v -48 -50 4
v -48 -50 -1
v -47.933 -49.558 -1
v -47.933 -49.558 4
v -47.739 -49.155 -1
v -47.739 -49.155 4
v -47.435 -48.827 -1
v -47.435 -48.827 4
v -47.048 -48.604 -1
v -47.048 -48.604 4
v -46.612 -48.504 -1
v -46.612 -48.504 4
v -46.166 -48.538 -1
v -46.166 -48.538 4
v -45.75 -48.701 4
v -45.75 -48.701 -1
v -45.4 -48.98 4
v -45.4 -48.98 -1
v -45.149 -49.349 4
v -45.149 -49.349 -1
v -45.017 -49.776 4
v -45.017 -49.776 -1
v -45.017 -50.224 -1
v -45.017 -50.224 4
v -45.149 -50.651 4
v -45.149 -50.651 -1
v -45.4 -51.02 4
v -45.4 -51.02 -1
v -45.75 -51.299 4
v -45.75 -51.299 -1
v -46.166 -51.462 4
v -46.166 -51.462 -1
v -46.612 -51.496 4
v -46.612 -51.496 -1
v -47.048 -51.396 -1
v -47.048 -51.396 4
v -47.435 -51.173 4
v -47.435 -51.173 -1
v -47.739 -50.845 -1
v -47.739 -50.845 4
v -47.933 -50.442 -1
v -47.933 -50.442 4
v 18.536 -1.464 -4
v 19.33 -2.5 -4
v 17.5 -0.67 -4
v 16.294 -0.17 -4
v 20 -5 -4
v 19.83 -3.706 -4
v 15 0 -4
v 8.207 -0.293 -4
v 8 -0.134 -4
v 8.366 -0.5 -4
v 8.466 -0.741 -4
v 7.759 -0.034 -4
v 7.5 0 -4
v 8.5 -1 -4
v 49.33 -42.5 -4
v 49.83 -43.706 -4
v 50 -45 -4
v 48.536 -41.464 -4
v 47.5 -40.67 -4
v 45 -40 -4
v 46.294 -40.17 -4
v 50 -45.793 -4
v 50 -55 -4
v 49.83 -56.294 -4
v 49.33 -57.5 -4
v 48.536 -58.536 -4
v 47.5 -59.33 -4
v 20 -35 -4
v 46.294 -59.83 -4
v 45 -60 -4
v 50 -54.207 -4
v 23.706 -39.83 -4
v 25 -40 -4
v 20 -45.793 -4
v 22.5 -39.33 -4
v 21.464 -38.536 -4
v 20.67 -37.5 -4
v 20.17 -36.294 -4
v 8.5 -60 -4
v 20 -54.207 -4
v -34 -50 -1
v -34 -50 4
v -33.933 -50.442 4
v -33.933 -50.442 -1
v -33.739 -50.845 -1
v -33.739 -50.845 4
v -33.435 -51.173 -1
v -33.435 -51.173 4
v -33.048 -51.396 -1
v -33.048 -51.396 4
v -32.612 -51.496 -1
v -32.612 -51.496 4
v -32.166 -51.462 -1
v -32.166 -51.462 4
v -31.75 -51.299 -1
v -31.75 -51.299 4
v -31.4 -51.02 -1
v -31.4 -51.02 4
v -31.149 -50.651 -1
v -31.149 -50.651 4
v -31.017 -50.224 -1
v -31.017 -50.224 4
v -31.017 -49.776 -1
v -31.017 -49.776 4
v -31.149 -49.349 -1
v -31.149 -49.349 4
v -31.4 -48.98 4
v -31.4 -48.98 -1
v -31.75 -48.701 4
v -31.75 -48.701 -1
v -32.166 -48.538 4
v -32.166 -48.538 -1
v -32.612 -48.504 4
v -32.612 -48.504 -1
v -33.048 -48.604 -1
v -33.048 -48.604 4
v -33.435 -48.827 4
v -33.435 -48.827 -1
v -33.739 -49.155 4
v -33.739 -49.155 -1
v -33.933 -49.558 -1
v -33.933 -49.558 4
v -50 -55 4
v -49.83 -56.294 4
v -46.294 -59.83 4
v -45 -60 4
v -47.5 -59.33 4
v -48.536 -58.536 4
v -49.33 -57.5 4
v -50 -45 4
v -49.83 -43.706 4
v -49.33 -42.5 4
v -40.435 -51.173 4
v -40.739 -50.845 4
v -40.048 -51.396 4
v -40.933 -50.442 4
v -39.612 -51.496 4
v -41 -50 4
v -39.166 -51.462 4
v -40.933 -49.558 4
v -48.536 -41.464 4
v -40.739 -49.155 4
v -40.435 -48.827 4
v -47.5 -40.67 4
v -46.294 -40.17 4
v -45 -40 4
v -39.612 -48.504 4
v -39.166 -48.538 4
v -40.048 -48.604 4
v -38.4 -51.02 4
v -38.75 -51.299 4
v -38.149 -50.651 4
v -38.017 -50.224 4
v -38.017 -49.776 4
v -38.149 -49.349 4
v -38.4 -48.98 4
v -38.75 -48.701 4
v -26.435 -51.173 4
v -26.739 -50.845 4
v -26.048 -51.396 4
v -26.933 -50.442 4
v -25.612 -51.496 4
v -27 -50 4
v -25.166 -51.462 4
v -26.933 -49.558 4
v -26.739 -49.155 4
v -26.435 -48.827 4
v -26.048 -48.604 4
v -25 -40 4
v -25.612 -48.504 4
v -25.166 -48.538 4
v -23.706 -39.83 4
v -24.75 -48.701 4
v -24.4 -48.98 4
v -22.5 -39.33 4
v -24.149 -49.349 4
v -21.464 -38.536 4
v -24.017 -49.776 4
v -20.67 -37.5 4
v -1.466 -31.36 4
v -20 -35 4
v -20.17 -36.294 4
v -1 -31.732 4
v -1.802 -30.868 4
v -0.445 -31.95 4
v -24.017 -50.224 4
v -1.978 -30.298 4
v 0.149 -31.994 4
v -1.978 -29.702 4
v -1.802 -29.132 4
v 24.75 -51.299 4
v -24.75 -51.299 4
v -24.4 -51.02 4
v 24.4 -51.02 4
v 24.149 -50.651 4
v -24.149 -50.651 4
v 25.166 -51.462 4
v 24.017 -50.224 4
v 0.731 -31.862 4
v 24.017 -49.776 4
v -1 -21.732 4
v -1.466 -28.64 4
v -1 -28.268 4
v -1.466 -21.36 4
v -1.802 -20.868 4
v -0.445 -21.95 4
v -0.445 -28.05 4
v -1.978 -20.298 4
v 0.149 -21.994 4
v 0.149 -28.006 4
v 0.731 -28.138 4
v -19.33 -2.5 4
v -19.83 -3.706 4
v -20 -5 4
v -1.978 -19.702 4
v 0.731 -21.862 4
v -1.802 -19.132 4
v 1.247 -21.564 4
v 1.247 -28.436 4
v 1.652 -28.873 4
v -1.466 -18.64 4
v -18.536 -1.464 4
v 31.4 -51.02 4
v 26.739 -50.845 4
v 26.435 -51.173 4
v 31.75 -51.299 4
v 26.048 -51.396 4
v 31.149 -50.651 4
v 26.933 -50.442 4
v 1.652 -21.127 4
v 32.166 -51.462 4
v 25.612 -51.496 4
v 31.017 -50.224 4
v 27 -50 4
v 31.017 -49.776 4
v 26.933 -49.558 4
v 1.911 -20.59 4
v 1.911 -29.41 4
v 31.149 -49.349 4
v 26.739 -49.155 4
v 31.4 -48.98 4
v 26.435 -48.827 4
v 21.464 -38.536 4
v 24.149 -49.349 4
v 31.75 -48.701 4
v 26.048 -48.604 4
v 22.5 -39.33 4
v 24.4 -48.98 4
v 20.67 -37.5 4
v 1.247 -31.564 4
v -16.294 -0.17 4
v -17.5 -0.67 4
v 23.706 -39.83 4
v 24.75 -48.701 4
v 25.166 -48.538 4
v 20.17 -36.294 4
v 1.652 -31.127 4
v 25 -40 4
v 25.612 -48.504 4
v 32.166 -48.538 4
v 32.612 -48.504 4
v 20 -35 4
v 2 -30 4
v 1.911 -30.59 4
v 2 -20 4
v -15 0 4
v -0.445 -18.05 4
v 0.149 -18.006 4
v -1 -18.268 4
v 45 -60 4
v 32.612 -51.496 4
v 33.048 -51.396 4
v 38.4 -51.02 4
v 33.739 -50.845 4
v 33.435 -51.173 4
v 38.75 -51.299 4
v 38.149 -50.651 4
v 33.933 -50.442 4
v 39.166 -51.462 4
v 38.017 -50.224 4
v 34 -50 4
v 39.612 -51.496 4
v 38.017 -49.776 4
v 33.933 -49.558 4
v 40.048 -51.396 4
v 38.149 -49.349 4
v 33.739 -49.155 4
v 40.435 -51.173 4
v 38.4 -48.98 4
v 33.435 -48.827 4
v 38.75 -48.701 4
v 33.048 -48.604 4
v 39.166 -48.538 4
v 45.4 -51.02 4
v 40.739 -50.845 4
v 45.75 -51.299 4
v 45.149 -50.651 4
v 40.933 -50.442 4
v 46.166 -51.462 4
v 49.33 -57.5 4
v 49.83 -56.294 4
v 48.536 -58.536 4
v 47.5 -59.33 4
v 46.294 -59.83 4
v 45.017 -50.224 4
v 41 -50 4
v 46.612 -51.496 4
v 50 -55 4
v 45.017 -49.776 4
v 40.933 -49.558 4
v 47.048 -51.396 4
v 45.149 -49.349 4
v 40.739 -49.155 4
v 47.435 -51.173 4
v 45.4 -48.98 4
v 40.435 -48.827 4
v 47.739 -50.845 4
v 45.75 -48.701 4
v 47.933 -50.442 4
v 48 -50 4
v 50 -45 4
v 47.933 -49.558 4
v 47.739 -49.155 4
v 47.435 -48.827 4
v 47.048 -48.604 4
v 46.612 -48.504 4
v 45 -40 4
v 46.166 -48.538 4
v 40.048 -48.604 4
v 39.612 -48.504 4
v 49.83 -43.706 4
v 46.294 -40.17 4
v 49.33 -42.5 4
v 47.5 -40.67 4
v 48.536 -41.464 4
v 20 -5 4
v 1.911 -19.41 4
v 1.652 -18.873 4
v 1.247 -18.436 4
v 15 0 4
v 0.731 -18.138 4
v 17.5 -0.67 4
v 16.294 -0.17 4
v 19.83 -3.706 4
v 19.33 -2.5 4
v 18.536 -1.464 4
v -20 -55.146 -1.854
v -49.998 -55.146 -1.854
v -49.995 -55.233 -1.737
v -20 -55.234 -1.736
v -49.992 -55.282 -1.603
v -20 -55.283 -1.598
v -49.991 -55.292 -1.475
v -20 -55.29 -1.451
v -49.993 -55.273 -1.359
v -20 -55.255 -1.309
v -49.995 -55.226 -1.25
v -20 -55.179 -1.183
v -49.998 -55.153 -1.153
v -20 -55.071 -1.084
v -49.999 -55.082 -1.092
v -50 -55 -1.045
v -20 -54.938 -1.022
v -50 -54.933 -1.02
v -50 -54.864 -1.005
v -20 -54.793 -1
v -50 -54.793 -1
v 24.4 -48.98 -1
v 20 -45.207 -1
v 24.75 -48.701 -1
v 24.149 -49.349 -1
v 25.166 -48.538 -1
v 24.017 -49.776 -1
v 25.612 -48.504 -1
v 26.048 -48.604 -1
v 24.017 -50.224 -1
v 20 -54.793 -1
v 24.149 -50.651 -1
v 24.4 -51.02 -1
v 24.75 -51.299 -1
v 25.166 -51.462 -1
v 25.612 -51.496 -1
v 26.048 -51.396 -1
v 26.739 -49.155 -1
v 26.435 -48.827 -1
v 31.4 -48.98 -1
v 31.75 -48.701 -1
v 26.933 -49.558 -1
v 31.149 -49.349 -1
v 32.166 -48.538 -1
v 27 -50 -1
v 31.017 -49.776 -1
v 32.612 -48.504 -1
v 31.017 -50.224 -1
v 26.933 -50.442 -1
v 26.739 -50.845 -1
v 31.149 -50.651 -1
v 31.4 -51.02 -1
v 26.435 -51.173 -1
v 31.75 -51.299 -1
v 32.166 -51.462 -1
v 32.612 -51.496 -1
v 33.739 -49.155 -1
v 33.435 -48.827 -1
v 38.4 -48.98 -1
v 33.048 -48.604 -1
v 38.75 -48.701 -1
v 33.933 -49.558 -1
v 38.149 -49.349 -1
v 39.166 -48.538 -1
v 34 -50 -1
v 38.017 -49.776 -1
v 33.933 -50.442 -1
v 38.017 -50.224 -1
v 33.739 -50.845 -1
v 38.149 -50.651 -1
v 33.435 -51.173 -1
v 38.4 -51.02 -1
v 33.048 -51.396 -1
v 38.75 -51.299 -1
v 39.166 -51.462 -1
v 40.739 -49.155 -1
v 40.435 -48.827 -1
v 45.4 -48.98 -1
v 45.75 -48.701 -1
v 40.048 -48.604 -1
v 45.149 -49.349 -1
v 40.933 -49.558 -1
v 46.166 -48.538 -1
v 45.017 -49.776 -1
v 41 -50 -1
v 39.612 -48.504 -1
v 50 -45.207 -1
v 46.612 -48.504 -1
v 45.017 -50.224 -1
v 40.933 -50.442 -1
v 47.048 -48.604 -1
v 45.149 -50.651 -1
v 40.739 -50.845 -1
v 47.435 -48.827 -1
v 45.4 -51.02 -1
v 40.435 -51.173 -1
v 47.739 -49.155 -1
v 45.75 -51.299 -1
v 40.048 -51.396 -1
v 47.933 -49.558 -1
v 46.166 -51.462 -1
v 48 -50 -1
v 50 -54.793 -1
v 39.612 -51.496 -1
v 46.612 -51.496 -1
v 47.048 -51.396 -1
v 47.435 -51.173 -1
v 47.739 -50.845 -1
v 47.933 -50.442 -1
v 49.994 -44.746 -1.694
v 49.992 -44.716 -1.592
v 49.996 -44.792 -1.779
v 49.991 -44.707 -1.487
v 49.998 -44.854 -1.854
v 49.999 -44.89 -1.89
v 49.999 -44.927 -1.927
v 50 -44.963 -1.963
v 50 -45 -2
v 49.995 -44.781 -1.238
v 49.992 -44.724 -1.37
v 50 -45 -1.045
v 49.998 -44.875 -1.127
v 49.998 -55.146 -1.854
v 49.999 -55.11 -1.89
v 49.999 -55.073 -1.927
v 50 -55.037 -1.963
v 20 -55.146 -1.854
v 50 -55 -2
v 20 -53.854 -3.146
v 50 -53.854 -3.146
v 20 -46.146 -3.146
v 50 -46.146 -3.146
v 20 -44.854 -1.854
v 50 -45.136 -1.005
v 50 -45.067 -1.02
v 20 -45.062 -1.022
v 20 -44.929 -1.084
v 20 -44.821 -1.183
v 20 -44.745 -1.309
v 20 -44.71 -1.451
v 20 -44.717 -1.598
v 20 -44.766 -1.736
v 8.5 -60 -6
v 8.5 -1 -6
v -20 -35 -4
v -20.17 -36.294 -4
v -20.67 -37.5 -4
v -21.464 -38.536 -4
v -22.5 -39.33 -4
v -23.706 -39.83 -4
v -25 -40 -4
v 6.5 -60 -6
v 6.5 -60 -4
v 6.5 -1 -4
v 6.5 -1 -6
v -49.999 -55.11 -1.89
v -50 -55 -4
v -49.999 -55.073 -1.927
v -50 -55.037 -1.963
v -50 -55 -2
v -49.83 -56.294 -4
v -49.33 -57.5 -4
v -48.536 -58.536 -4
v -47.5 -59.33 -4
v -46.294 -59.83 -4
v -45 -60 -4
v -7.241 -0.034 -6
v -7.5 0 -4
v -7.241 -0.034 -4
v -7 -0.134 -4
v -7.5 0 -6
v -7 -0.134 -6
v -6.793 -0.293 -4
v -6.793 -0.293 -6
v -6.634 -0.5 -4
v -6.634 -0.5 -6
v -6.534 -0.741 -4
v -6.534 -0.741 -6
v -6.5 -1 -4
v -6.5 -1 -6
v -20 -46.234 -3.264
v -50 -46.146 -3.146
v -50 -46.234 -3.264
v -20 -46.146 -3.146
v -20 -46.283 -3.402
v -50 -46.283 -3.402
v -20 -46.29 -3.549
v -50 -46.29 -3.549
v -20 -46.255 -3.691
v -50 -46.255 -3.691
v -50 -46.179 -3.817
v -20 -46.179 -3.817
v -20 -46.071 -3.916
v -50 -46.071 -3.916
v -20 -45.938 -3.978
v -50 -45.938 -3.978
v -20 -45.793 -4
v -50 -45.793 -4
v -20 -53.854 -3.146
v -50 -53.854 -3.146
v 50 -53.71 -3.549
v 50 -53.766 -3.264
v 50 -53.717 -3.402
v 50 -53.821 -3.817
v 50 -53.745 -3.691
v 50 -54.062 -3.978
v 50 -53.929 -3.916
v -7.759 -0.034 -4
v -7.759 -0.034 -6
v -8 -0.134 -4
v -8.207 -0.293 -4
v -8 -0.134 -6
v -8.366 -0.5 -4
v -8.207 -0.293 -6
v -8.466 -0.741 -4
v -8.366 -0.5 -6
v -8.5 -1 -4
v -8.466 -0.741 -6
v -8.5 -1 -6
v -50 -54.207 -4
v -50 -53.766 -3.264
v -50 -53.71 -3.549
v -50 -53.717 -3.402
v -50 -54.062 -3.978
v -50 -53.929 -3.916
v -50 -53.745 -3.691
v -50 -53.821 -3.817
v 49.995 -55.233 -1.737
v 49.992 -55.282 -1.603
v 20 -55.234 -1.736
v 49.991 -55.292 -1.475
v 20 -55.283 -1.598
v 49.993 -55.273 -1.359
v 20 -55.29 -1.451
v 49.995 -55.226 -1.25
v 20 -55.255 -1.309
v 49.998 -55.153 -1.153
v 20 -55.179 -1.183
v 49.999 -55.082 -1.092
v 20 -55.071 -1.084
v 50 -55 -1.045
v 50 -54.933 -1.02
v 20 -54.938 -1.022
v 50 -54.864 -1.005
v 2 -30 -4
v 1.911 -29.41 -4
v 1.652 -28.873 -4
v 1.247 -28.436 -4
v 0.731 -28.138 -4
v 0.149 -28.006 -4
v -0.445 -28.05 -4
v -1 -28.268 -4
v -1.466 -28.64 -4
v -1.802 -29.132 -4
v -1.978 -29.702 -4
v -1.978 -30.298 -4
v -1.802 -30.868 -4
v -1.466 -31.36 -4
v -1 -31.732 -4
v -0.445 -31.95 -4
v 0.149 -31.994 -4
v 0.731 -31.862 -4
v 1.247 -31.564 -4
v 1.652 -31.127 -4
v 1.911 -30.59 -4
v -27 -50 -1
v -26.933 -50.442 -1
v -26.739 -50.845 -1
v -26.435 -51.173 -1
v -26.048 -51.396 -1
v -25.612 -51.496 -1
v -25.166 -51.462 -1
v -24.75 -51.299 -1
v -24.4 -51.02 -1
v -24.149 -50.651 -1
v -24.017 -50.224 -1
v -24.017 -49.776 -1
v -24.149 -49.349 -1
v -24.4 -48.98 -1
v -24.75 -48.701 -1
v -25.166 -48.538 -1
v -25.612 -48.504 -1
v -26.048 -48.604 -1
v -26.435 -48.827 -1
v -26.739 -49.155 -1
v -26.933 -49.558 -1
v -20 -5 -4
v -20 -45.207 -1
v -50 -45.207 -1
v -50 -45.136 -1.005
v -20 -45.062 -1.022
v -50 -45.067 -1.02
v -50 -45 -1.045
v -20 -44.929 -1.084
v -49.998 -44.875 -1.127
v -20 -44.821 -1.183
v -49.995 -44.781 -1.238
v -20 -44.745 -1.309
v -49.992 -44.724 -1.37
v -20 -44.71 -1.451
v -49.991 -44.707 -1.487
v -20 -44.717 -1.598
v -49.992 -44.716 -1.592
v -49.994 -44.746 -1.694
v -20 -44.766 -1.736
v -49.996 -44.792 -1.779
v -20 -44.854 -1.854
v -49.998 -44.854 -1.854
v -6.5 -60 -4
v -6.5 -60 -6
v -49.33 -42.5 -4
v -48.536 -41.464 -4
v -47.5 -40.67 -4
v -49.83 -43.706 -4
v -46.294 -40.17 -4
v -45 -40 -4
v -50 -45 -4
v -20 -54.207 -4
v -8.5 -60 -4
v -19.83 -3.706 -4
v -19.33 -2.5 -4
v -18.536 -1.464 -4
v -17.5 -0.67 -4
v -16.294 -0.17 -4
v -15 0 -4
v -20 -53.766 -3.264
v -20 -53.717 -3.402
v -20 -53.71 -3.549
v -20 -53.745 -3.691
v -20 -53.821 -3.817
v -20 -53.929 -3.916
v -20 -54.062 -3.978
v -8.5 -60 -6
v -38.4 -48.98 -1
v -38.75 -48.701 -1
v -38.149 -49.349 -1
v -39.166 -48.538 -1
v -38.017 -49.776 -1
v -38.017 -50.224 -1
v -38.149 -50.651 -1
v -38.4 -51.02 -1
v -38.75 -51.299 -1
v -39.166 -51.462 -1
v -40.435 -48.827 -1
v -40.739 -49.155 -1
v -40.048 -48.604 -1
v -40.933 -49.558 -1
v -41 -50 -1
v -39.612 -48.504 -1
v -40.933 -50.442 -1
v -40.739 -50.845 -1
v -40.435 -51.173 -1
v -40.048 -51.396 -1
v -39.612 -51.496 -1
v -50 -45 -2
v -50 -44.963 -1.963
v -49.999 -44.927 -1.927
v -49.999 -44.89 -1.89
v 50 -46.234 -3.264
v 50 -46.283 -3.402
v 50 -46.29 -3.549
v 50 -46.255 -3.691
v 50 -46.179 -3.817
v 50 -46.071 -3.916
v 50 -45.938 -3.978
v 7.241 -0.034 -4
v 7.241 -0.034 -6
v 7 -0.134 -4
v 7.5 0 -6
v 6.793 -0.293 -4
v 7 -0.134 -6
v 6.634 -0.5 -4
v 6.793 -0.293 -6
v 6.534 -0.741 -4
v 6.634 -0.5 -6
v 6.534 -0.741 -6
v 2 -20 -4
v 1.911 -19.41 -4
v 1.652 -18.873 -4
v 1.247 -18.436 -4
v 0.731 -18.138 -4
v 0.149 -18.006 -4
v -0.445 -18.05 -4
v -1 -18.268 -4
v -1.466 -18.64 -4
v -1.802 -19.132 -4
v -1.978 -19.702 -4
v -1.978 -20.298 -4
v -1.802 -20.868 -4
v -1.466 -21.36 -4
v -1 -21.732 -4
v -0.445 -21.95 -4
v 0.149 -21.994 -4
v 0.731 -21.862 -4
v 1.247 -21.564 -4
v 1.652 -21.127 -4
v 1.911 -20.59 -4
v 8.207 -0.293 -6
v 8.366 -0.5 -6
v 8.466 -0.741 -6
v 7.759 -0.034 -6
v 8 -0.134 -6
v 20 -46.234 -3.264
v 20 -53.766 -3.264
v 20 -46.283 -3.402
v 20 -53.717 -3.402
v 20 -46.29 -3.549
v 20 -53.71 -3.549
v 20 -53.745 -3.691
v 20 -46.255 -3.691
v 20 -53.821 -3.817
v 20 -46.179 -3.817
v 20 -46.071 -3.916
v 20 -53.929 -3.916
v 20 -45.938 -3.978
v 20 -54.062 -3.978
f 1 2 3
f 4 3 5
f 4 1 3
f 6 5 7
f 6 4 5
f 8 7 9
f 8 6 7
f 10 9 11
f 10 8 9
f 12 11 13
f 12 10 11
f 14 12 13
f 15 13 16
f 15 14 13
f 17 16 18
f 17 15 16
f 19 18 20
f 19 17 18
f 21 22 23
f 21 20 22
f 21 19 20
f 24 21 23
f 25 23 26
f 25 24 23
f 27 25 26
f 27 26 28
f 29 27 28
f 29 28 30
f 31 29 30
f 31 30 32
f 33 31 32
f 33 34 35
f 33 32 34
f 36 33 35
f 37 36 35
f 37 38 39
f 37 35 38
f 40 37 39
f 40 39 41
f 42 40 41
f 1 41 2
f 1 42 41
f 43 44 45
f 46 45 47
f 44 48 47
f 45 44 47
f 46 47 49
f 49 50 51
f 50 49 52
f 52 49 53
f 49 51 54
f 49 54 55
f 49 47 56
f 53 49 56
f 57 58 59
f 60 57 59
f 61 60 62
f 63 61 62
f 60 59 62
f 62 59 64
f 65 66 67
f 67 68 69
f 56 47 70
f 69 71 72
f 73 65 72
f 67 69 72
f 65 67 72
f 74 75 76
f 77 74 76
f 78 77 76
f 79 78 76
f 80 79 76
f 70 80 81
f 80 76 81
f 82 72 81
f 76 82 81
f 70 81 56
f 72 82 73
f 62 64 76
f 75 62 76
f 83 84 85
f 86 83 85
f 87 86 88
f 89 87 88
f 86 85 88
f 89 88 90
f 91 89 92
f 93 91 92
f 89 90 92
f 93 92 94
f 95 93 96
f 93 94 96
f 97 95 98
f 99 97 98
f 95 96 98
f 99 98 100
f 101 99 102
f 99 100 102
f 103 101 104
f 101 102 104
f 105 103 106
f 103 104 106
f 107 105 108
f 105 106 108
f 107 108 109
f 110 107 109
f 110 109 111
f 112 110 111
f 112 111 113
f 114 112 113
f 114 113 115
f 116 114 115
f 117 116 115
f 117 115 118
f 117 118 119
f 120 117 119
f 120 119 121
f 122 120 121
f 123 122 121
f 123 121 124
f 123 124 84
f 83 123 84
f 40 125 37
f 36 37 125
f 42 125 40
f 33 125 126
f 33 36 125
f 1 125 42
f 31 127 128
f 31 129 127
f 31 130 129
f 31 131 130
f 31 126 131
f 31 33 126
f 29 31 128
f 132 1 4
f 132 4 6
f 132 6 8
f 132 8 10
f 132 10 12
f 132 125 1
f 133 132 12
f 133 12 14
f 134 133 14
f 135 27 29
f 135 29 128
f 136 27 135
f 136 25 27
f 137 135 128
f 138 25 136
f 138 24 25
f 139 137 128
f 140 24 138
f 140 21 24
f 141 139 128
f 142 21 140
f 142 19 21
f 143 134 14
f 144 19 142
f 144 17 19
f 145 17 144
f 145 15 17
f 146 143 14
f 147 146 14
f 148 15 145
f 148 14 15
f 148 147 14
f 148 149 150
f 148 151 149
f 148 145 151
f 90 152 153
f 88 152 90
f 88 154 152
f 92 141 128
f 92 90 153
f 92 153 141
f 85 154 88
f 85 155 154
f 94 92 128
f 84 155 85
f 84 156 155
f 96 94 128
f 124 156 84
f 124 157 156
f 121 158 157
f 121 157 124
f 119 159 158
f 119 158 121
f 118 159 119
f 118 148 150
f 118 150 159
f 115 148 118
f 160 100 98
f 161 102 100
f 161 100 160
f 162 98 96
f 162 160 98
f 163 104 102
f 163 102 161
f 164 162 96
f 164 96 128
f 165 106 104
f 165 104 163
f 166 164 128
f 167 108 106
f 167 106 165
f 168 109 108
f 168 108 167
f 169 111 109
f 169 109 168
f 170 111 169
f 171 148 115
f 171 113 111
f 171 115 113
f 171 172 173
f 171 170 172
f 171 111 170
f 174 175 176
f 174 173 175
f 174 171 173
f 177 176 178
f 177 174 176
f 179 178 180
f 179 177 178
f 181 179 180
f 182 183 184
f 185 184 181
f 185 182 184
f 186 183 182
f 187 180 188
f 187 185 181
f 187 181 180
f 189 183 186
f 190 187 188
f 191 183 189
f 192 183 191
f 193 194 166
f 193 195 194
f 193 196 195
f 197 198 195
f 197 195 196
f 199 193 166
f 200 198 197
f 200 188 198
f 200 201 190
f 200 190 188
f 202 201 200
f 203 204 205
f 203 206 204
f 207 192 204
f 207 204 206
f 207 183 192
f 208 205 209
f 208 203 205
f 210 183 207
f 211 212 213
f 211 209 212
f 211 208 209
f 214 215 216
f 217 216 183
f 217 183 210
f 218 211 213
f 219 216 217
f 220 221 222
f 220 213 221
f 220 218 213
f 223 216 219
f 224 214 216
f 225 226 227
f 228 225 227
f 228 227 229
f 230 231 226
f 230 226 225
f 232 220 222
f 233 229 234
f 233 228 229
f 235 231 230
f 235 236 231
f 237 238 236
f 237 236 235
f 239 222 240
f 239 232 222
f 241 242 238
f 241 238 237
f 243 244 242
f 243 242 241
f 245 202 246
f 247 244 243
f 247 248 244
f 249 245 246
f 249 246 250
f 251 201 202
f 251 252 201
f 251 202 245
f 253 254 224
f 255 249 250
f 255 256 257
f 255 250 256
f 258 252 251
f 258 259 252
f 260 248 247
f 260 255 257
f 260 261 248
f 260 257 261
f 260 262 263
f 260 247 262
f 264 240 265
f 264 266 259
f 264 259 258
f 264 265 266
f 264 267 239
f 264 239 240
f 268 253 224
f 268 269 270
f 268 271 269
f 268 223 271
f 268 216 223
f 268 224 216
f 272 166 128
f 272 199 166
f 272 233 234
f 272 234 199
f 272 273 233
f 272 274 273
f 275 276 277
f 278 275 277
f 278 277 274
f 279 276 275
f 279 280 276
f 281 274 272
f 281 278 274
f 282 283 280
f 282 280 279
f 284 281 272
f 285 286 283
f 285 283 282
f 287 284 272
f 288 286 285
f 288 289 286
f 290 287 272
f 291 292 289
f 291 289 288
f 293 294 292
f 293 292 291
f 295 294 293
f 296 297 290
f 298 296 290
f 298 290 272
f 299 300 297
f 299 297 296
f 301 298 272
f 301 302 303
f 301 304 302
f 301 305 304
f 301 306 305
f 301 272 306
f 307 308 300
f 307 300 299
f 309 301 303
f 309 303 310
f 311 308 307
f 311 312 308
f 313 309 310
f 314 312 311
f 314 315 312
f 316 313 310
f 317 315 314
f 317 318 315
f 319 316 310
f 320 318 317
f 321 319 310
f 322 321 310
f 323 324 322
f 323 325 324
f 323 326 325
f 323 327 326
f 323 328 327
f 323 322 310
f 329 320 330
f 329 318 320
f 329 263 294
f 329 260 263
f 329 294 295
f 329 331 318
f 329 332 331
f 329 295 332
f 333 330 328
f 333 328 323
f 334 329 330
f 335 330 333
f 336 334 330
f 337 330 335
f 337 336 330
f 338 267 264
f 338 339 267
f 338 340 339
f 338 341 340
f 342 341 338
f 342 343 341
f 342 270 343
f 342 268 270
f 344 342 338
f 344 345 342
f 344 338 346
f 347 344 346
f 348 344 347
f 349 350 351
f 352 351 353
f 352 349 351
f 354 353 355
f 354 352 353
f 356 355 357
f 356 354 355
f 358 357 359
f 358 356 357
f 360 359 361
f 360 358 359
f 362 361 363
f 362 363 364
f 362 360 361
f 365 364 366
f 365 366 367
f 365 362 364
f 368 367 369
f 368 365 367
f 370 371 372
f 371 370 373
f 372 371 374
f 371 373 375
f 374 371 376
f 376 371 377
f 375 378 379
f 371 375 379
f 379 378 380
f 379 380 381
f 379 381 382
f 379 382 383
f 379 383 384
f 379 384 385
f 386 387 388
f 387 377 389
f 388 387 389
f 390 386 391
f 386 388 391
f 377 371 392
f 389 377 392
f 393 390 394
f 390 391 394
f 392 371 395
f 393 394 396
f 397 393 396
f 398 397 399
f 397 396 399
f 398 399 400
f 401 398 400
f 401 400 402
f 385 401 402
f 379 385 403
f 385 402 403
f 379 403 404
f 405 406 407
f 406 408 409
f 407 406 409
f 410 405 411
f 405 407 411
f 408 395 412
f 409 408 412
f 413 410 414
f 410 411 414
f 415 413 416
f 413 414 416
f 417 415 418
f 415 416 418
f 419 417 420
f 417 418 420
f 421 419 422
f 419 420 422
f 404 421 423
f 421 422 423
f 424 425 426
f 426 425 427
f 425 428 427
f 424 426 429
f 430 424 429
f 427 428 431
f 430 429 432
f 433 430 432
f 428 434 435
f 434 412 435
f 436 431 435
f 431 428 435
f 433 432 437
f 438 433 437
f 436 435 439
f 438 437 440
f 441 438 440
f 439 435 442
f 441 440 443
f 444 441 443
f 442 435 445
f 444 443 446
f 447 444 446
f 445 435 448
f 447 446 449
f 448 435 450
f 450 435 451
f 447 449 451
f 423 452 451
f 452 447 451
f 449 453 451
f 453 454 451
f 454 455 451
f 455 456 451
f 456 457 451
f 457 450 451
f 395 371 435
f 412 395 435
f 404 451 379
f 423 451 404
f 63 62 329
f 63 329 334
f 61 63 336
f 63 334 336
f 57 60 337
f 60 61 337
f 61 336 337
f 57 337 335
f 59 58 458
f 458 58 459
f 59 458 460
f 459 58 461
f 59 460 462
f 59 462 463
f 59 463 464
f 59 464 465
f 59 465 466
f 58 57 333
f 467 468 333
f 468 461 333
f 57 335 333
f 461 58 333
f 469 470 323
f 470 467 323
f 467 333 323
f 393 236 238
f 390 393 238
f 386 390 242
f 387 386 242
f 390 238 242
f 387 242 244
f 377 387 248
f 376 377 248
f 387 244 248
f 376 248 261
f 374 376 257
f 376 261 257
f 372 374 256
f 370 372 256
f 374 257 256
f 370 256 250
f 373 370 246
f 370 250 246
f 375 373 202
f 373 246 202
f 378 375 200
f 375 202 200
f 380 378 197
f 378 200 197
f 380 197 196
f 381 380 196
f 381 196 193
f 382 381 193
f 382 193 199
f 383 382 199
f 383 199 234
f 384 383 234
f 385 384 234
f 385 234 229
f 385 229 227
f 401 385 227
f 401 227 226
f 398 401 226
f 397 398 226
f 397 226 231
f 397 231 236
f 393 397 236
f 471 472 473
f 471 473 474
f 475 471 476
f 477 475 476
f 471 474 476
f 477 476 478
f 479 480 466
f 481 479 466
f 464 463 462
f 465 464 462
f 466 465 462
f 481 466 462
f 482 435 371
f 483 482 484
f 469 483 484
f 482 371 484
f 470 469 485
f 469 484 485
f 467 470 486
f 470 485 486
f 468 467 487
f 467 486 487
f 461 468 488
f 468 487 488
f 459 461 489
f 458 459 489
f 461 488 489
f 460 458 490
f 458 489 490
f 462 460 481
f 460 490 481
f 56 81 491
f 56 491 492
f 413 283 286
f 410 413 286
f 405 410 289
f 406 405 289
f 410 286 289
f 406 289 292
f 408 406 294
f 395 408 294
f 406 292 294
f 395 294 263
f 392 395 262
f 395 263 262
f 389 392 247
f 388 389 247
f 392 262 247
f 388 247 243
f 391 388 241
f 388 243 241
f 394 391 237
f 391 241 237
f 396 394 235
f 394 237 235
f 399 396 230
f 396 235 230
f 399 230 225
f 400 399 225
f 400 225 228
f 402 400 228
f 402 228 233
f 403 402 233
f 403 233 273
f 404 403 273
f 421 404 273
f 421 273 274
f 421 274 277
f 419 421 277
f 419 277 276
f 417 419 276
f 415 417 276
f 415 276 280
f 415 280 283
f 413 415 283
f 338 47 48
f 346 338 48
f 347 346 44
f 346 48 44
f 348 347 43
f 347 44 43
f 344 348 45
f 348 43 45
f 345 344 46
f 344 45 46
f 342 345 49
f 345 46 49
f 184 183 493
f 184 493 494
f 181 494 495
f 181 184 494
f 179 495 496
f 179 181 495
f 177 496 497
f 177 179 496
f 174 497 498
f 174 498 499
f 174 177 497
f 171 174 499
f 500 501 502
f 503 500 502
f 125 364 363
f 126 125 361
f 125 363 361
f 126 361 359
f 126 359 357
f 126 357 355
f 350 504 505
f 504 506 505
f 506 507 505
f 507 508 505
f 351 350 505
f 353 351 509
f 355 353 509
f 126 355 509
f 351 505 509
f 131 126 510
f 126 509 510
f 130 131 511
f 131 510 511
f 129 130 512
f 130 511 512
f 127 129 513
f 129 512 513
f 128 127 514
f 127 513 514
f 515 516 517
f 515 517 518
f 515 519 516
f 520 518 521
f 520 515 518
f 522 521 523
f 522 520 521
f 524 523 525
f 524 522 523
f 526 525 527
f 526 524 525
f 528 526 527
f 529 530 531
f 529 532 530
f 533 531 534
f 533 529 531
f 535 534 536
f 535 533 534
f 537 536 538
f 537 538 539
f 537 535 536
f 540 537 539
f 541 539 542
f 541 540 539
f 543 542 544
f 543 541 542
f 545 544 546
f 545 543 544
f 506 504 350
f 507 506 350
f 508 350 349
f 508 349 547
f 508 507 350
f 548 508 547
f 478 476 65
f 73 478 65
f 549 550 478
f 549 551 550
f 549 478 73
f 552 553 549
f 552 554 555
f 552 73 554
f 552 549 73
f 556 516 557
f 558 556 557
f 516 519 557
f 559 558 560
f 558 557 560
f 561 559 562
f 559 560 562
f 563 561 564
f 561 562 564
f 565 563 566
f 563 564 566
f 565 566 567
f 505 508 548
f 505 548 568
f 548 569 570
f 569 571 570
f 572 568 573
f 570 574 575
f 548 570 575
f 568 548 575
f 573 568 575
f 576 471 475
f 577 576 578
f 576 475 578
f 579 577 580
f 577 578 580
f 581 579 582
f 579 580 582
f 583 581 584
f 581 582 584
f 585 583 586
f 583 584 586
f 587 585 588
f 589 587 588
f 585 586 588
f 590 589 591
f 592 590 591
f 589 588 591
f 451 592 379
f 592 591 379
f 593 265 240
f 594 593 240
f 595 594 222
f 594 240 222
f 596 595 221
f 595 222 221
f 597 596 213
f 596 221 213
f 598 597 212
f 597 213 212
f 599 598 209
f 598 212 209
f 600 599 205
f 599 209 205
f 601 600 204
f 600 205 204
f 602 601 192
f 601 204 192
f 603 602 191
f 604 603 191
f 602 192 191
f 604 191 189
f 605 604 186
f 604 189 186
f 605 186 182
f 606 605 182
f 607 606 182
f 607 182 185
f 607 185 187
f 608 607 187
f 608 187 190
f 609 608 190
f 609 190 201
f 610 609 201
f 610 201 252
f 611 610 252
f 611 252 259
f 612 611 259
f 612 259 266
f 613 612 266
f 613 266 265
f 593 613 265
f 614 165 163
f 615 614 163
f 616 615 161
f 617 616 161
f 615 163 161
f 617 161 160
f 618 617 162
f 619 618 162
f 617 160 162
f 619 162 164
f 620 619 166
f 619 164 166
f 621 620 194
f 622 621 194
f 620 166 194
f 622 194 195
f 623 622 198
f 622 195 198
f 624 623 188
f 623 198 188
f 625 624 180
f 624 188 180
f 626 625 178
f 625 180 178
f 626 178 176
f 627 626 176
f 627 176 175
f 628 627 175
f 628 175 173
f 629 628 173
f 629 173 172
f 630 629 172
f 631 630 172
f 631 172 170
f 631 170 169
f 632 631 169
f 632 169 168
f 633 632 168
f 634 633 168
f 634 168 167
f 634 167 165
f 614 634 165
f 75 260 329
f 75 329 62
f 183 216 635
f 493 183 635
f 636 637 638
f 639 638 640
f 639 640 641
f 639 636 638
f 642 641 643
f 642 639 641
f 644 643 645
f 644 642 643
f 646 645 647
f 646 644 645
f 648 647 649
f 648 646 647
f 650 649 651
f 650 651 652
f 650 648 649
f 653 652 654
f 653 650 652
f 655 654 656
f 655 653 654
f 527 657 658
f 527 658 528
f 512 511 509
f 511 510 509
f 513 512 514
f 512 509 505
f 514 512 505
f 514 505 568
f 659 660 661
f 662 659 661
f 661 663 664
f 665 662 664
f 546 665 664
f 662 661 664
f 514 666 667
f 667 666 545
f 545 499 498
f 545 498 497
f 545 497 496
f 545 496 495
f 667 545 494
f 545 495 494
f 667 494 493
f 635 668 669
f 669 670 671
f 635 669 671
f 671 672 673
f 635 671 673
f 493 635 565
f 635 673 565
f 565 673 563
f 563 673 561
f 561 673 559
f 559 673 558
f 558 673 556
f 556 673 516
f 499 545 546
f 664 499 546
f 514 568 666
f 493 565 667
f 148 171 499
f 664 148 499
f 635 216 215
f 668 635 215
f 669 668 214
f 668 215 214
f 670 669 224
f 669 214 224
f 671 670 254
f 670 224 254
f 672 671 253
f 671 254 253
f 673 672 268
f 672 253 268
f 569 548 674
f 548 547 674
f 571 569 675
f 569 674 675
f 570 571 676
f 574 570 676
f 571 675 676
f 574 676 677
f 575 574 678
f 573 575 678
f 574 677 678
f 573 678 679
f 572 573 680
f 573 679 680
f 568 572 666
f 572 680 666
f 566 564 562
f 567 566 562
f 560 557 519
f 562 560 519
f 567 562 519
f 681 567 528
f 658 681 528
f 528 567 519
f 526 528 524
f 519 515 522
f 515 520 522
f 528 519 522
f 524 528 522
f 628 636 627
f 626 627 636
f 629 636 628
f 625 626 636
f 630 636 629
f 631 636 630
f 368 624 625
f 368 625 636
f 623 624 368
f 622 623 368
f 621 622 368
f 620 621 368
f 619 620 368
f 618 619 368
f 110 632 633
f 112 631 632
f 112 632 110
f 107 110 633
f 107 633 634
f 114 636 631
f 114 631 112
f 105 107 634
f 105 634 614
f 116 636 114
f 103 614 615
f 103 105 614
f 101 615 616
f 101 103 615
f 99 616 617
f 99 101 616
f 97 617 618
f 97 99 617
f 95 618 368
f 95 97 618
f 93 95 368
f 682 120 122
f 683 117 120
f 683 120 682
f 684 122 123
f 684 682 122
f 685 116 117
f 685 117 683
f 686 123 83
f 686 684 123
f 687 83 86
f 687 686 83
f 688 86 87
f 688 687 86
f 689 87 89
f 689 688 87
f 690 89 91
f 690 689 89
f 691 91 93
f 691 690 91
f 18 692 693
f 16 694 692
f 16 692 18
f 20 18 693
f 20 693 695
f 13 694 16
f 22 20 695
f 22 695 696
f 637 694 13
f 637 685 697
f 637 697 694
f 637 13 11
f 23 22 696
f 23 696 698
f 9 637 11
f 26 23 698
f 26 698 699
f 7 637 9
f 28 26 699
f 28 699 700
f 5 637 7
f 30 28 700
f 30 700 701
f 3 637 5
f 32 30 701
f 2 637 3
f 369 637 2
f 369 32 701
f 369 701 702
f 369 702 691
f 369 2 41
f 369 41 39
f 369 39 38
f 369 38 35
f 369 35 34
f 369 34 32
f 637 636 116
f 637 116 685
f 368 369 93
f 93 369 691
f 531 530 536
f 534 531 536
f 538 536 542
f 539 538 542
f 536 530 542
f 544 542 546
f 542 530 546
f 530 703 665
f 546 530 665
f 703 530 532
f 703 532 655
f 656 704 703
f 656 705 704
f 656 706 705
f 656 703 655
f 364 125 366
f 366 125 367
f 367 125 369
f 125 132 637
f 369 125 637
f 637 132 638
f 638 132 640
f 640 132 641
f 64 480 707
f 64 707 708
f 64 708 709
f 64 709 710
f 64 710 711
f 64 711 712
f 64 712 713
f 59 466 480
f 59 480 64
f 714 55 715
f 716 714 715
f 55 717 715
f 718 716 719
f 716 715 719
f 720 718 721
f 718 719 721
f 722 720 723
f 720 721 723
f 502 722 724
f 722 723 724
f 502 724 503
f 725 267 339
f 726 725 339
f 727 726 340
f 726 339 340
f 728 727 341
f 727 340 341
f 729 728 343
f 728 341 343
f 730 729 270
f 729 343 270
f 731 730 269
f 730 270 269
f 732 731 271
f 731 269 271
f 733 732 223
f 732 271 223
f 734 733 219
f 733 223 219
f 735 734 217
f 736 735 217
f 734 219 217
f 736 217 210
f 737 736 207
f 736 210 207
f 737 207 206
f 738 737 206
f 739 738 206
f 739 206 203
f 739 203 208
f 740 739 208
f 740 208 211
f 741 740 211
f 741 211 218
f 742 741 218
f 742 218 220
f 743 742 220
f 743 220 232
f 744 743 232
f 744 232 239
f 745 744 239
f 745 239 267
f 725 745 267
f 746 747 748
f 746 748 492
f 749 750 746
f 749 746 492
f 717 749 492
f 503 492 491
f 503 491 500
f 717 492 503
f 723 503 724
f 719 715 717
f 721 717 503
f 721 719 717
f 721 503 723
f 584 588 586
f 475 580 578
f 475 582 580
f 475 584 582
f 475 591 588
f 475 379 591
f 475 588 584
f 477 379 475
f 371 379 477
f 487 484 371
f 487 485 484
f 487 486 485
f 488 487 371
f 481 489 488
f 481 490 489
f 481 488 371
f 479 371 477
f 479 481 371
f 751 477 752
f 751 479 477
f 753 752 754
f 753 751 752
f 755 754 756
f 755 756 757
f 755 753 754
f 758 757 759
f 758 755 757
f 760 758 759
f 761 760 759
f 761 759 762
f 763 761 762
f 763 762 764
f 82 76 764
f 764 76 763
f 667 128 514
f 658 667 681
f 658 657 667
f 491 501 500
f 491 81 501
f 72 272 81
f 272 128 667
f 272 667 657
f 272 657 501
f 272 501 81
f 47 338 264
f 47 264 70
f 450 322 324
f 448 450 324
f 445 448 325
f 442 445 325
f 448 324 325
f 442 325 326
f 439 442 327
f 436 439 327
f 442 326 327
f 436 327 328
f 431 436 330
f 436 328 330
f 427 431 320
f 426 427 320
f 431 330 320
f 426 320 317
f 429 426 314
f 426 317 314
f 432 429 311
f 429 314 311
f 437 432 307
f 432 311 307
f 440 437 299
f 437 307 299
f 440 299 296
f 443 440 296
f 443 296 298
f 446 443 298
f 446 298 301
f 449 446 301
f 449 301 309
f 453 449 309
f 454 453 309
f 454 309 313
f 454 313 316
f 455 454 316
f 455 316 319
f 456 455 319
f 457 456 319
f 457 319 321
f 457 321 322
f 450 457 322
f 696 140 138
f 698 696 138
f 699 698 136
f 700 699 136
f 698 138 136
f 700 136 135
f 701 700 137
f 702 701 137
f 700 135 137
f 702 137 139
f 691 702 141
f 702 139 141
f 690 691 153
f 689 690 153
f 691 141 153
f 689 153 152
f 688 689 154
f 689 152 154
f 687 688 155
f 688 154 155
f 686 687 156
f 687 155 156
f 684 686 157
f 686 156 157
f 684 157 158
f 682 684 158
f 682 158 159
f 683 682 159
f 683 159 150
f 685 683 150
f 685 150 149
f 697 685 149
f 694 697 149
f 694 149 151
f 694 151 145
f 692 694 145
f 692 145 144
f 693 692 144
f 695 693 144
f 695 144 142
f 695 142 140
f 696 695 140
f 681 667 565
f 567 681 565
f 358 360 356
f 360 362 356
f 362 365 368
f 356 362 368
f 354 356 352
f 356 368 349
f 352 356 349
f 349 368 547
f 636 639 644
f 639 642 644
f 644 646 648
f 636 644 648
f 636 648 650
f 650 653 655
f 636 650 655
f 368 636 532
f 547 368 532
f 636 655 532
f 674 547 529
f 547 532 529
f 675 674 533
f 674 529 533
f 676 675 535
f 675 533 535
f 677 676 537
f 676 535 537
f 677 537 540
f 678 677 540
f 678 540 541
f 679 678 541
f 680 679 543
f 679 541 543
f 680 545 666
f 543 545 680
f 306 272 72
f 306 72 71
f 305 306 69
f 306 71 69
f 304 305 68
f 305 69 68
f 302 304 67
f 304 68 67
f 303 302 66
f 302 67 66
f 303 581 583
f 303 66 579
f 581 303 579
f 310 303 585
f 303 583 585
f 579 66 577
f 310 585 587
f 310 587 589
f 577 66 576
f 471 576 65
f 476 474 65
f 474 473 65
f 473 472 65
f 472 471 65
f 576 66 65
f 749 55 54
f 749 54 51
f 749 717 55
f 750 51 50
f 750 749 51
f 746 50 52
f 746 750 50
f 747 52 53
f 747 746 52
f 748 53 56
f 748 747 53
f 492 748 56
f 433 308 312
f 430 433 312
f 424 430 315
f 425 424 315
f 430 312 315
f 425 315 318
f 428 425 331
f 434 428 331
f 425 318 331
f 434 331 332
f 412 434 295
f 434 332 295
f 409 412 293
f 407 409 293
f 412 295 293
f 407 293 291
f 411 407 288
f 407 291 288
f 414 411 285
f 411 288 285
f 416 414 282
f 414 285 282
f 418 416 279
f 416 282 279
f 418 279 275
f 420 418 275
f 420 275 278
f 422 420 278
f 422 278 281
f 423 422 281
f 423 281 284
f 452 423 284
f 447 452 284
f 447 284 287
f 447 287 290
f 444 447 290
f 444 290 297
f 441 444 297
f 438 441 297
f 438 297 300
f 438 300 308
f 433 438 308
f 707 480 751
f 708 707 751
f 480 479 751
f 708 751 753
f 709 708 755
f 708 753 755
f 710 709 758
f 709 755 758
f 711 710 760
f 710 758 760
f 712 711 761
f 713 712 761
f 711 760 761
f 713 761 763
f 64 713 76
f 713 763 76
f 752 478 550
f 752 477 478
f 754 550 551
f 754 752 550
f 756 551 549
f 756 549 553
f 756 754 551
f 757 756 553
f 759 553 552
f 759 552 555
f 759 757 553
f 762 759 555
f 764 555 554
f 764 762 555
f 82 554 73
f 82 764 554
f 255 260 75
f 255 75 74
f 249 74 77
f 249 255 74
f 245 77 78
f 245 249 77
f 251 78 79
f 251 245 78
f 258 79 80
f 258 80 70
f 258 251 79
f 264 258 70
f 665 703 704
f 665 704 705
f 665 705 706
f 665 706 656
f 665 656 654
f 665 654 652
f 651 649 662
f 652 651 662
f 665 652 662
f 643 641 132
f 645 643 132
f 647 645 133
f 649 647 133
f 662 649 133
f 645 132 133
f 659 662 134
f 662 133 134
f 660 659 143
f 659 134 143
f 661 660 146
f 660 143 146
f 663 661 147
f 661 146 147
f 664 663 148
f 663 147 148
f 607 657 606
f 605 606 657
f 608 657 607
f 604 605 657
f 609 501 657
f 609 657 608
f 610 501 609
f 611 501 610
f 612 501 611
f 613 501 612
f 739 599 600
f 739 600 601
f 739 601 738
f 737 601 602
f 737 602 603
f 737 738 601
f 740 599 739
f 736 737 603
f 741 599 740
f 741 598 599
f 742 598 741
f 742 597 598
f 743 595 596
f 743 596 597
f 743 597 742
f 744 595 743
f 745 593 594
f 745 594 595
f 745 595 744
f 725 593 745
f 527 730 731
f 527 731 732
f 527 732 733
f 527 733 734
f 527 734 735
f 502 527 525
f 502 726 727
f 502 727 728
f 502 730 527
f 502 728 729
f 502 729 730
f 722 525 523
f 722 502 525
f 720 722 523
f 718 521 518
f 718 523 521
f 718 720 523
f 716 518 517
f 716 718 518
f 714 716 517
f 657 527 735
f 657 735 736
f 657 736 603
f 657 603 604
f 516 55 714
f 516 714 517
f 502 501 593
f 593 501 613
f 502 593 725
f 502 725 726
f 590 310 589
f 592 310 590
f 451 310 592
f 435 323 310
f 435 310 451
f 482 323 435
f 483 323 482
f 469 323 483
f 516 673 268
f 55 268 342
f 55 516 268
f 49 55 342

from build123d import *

# Parameters (mm, degrees)
SKETCH1_W               = 40
SKETCH1_H               = 8
BOSS_EXTRUDE1_DEPTH     = 60
SKETCH2_W               = 8
SKETCH2_H               = 20
BOSS_EXTRUDE2_DEPTH     = 30
CUT_EXTRUDE1_DEPTH      = 30
SKETCH6_R               = 1.5
CUT_EXTRUDE2_DEPTH      = 79.511145706
LPATTERN1_COUNT         = 4
LPATTERN1_PITCH         = 7
MIRROR3_COPY_1_SKETCH_R = 1.5
MIRROR3_COPY_1_DEPTH    = 79.511145706
MIRROR3_COPY_2_SKETCH_R = 1.5
MIRROR3_COPY_2_DEPTH    = 79.511145706
MIRROR3_COPY_3_SKETCH_R = 1.5
MIRROR3_COPY_3_DEPTH    = 79.511145706
SKETCH7_R               = 2
CUT_EXTRUDE3_DEPTH      = 30
SKETCH8_W               = 2
SKETCH8_H               = 60
BOSS_EXTRUDE3_DEPTH     = 2
FILLET1_R               = 1
FILLET1_OF_MIRROR4_R    = 1
FILLET2_R               = 0.5
FILLET3_R               = 5
SKETCH9_R               = 2
CUT_EXTRUDE4_DEPTH      = 10


# Some blends are built 0.0001 mm under size
with BuildPart() as part:
    # Sketch1 → Boss-Extrude1 (new body)
    with BuildSketch(Plane(origin=(0, 0, 0), x_dir=(1, 0, 0), z_dir=(0, 1, 0))):
        Rectangle(SKETCH1_W, SKETCH1_H)
    extrude(amount=-BOSS_EXTRUDE1_DEPTH)

    # Sketch2 → Boss-Extrude2 (add)
    with BuildSketch(Plane(origin=(20, 0, 0), x_dir=(0, 0, -1), z_dir=(1, 0, 0))):
        with Locations((0, -50)):
            Rectangle(SKETCH2_W, SKETCH2_H)
    boss_extrude2 = extrude(amount=BOSS_EXTRUDE2_DEPTH)

    # Sketch3 → Cut-Extrude1 (cut)
    with BuildSketch(Plane(origin=(50, 0, 0), x_dir=(0, 0, -1), z_dir=(1, 0, 0))):
        Polygon((1, -50), (1, -56), (4, -53), (4, -47), (1, -44), align=None)
    cut_extrude1 = extrude(amount=-CUT_EXTRUDE1_DEPTH, mode=Mode.SUBTRACT)

    # Sketch6 → Cut-Extrude2 (cut, through all)
    with BuildSketch(Plane.XY.offset(4)):
        with Locations((46.5, -50)):
            Circle(SKETCH6_R)
    cut_extrude2 = extrude(amount=-CUT_EXTRUDE2_DEPTH, mode=Mode.SUBTRACT)

    # LPattern1: Cut-Extrude2 ×4
    with Locations(*[(-i * LPATTERN1_PITCH, 0, 0) for i in range(1, LPATTERN1_COUNT)]):
        add(cut_extrude2, mode=Mode.SUBTRACT)

    # Mirror3: Boss-Extrude2, Cut-Extrude1, Cut-Extrude2 across plane
    add(boss_extrude2.mirror(Plane(origin=(0, 0, 0), x_dir=(0, 0, 1), z_dir=(1, 0, 0))))
    add(cut_extrude1.mirror(Plane(origin=(0, 0, 0), x_dir=(0, 0, 1), z_dir=(1, 0, 0))), mode=Mode.SUBTRACT)
    add(cut_extrude2.mirror(Plane(origin=(0, 0, 0), x_dir=(0, 0, 1), z_dir=(1, 0, 0))), mode=Mode.SUBTRACT)

    # Mirror3 copy 1 sketch → Mirror3 copy 1 (cut, through all)
    with BuildSketch(Plane(origin=(7, 0, 4), x_dir=(-1, 0, 0), z_dir=(0, 0, 1))):
        with Locations((46.5, 50)):
            Circle(MIRROR3_COPY_1_SKETCH_R)
    extrude(amount=-MIRROR3_COPY_1_DEPTH, mode=Mode.SUBTRACT)

    # Mirror3 copy 2 sketch → Mirror3 copy 2 (cut, through all)
    with BuildSketch(Plane(origin=(14, 0, 4), x_dir=(-1, 0, 0), z_dir=(0, 0, 1))):
        with Locations((46.5, 50)):
            Circle(MIRROR3_COPY_2_SKETCH_R)
    extrude(amount=-MIRROR3_COPY_2_DEPTH, mode=Mode.SUBTRACT)

    # Mirror3 copy 3 sketch → Mirror3 copy 3 (cut, through all)
    with BuildSketch(Plane(origin=(21, 0, 4), x_dir=(-1, 0, 0), z_dir=(0, 0, 1))):
        with Locations((46.5, 50)):
            Circle(MIRROR3_COPY_3_SKETCH_R)
    extrude(amount=-MIRROR3_COPY_3_DEPTH, mode=Mode.SUBTRACT)

    # Sketch7 → Cut-Extrude3 (cut)
    with BuildSketch(Plane.XY.offset(4)):
        with Locations((0, -30)):
            Circle(SKETCH7_R)
    extrude(amount=-CUT_EXTRUDE3_DEPTH, mode=Mode.SUBTRACT)

    # Sketch8 → Boss-Extrude3 (add)
    with BuildSketch(Plane(origin=(0, 0, -4), x_dir=(-1, 0, 0), z_dir=(0, 0, -1))):
        with Locations((-7.5, -30)):
            Rectangle(SKETCH8_W, SKETCH8_H)
    boss_extrude3 = extrude(amount=BOSS_EXTRUDE3_DEPTH)

    # Fillet1
    fillet1_edges = [part.edges().sort_by_distance(p)[0] for p in [
        (8.5, 0, -5),
        (6.5, 0, -5),
    ]]
    fillet(fillet1_edges, radius=FILLET1_R - 0.0001)  # a hair under: the kernel refuses the full size

    # Mirror4: Boss-Extrude3 across plane
    add(boss_extrude3.mirror(Plane(origin=(0, 0, 0), x_dir=(0, 0, 1), z_dir=(1, 0, 0))))

    # Fillet1 of Mirror4
    fillet1_of_mirror4_edges = [part.edges().sort_by_distance(p)[0] for p in [
        (-8.5, 0, -5),
        (-6.5, 0, -5),
    ]]
    fillet(fillet1_of_mirror4_edges, radius=FILLET1_OF_MIRROR4_R - 0.0001)  # a hair under: the kernel refuses the full size

    # Fillet2
    fillet2_edges = [part.edges().sort_by_distance(p)[0] for p in [
        (35, -44, -1),
        (35, -47, -4),
        (35, -53, -4),
        (35, -56, -1),
        (-35, -44, -1),
        (-35, -56, -1),
        (-35, -53, -4),
        (-35, -47, -4),
    ]]
    fillet(fillet2_edges, radius=FILLET2_R)

    # Fillet3
    # the kernel refuses this fillet: 5 mm, written as the material it adds along each edge
    with BuildSketch(Plane(origin=(20, -40, 4), x_dir=(1, 0, 0), z_dir=(0, 0, -1))) as fillet3_piece_1:
        with BuildLine():
            CenterArc((FILLET3_R, -FILLET3_R), FILLET3_R, 90, 90)
            Line((0, -FILLET3_R), (0, 0))
            Line((0, 0), (FILLET3_R, 0))
        make_face()
    extrude(amount=8)
    with BuildSketch(Plane(origin=(-20, -40, 4), x_dir=(-1, 0, 0), z_dir=(0, 0, -1))) as fillet3_piece_2:
        with BuildLine():
            CenterArc((FILLET3_R, FILLET3_R), FILLET3_R, 180, 90)
            Line((0, FILLET3_R), (0, 0))
            Line((0, 0), (FILLET3_R, 0))
        make_face()
    extrude(amount=8)
    # the kernel refuses this fillet: 5 mm, written as the material it takes off along each edge
    with BuildSketch(Plane(origin=(50, -60, -16.5), x_dir=(-1, 0, 0), z_dir=(0, 0, 1)), Plane(origin=(-50, -40, 16.5), x_dir=(0, -1, 0), z_dir=(0, 0, -1)), Plane(origin=(-50, -60, -16.5), x_dir=(0, 1, 0), z_dir=(0, 0, 1))) as fillet3_2_piece_1:
        with BuildLine():
            CenterArc((FILLET3_R, -FILLET3_R), FILLET3_R, 90, 90)
            Line((0, -FILLET3_R), (0, 0))
            Line((0, 0), (FILLET3_R, 0))
        make_face()
    extrude(amount=33, mode=Mode.SUBTRACT)
    with BuildSketch(Plane(origin=(50, -40, 16.5), x_dir=(0, -1, 0), z_dir=(0, 0, -1)), Plane(origin=(-20, 0, 16.5), x_dir=(1, 0, 0), z_dir=(0, 0, -1)), Plane(origin=(20, 0, -16.5), x_dir=(-1, 0, 0), z_dir=(0, 0, 1))) as fillet3_2_piece_2:
        with BuildLine():
            CenterArc((FILLET3_R, FILLET3_R), FILLET3_R, 180, 90)
            Line((0, FILLET3_R), (0, 0))
            Line((0, 0), (FILLET3_R, 0))
        make_face()
    extrude(amount=33, mode=Mode.SUBTRACT)

    # Sketch9 → Cut-Extrude4 (cut)
    with BuildSketch(Plane.XY.offset(4)):
        with Locations((0, -20)):
            Circle(SKETCH9_R)
    extrude(amount=-CUT_EXTRUDE4_DEPTH, mode=Mode.SUBTRACT)


solid = part.part
